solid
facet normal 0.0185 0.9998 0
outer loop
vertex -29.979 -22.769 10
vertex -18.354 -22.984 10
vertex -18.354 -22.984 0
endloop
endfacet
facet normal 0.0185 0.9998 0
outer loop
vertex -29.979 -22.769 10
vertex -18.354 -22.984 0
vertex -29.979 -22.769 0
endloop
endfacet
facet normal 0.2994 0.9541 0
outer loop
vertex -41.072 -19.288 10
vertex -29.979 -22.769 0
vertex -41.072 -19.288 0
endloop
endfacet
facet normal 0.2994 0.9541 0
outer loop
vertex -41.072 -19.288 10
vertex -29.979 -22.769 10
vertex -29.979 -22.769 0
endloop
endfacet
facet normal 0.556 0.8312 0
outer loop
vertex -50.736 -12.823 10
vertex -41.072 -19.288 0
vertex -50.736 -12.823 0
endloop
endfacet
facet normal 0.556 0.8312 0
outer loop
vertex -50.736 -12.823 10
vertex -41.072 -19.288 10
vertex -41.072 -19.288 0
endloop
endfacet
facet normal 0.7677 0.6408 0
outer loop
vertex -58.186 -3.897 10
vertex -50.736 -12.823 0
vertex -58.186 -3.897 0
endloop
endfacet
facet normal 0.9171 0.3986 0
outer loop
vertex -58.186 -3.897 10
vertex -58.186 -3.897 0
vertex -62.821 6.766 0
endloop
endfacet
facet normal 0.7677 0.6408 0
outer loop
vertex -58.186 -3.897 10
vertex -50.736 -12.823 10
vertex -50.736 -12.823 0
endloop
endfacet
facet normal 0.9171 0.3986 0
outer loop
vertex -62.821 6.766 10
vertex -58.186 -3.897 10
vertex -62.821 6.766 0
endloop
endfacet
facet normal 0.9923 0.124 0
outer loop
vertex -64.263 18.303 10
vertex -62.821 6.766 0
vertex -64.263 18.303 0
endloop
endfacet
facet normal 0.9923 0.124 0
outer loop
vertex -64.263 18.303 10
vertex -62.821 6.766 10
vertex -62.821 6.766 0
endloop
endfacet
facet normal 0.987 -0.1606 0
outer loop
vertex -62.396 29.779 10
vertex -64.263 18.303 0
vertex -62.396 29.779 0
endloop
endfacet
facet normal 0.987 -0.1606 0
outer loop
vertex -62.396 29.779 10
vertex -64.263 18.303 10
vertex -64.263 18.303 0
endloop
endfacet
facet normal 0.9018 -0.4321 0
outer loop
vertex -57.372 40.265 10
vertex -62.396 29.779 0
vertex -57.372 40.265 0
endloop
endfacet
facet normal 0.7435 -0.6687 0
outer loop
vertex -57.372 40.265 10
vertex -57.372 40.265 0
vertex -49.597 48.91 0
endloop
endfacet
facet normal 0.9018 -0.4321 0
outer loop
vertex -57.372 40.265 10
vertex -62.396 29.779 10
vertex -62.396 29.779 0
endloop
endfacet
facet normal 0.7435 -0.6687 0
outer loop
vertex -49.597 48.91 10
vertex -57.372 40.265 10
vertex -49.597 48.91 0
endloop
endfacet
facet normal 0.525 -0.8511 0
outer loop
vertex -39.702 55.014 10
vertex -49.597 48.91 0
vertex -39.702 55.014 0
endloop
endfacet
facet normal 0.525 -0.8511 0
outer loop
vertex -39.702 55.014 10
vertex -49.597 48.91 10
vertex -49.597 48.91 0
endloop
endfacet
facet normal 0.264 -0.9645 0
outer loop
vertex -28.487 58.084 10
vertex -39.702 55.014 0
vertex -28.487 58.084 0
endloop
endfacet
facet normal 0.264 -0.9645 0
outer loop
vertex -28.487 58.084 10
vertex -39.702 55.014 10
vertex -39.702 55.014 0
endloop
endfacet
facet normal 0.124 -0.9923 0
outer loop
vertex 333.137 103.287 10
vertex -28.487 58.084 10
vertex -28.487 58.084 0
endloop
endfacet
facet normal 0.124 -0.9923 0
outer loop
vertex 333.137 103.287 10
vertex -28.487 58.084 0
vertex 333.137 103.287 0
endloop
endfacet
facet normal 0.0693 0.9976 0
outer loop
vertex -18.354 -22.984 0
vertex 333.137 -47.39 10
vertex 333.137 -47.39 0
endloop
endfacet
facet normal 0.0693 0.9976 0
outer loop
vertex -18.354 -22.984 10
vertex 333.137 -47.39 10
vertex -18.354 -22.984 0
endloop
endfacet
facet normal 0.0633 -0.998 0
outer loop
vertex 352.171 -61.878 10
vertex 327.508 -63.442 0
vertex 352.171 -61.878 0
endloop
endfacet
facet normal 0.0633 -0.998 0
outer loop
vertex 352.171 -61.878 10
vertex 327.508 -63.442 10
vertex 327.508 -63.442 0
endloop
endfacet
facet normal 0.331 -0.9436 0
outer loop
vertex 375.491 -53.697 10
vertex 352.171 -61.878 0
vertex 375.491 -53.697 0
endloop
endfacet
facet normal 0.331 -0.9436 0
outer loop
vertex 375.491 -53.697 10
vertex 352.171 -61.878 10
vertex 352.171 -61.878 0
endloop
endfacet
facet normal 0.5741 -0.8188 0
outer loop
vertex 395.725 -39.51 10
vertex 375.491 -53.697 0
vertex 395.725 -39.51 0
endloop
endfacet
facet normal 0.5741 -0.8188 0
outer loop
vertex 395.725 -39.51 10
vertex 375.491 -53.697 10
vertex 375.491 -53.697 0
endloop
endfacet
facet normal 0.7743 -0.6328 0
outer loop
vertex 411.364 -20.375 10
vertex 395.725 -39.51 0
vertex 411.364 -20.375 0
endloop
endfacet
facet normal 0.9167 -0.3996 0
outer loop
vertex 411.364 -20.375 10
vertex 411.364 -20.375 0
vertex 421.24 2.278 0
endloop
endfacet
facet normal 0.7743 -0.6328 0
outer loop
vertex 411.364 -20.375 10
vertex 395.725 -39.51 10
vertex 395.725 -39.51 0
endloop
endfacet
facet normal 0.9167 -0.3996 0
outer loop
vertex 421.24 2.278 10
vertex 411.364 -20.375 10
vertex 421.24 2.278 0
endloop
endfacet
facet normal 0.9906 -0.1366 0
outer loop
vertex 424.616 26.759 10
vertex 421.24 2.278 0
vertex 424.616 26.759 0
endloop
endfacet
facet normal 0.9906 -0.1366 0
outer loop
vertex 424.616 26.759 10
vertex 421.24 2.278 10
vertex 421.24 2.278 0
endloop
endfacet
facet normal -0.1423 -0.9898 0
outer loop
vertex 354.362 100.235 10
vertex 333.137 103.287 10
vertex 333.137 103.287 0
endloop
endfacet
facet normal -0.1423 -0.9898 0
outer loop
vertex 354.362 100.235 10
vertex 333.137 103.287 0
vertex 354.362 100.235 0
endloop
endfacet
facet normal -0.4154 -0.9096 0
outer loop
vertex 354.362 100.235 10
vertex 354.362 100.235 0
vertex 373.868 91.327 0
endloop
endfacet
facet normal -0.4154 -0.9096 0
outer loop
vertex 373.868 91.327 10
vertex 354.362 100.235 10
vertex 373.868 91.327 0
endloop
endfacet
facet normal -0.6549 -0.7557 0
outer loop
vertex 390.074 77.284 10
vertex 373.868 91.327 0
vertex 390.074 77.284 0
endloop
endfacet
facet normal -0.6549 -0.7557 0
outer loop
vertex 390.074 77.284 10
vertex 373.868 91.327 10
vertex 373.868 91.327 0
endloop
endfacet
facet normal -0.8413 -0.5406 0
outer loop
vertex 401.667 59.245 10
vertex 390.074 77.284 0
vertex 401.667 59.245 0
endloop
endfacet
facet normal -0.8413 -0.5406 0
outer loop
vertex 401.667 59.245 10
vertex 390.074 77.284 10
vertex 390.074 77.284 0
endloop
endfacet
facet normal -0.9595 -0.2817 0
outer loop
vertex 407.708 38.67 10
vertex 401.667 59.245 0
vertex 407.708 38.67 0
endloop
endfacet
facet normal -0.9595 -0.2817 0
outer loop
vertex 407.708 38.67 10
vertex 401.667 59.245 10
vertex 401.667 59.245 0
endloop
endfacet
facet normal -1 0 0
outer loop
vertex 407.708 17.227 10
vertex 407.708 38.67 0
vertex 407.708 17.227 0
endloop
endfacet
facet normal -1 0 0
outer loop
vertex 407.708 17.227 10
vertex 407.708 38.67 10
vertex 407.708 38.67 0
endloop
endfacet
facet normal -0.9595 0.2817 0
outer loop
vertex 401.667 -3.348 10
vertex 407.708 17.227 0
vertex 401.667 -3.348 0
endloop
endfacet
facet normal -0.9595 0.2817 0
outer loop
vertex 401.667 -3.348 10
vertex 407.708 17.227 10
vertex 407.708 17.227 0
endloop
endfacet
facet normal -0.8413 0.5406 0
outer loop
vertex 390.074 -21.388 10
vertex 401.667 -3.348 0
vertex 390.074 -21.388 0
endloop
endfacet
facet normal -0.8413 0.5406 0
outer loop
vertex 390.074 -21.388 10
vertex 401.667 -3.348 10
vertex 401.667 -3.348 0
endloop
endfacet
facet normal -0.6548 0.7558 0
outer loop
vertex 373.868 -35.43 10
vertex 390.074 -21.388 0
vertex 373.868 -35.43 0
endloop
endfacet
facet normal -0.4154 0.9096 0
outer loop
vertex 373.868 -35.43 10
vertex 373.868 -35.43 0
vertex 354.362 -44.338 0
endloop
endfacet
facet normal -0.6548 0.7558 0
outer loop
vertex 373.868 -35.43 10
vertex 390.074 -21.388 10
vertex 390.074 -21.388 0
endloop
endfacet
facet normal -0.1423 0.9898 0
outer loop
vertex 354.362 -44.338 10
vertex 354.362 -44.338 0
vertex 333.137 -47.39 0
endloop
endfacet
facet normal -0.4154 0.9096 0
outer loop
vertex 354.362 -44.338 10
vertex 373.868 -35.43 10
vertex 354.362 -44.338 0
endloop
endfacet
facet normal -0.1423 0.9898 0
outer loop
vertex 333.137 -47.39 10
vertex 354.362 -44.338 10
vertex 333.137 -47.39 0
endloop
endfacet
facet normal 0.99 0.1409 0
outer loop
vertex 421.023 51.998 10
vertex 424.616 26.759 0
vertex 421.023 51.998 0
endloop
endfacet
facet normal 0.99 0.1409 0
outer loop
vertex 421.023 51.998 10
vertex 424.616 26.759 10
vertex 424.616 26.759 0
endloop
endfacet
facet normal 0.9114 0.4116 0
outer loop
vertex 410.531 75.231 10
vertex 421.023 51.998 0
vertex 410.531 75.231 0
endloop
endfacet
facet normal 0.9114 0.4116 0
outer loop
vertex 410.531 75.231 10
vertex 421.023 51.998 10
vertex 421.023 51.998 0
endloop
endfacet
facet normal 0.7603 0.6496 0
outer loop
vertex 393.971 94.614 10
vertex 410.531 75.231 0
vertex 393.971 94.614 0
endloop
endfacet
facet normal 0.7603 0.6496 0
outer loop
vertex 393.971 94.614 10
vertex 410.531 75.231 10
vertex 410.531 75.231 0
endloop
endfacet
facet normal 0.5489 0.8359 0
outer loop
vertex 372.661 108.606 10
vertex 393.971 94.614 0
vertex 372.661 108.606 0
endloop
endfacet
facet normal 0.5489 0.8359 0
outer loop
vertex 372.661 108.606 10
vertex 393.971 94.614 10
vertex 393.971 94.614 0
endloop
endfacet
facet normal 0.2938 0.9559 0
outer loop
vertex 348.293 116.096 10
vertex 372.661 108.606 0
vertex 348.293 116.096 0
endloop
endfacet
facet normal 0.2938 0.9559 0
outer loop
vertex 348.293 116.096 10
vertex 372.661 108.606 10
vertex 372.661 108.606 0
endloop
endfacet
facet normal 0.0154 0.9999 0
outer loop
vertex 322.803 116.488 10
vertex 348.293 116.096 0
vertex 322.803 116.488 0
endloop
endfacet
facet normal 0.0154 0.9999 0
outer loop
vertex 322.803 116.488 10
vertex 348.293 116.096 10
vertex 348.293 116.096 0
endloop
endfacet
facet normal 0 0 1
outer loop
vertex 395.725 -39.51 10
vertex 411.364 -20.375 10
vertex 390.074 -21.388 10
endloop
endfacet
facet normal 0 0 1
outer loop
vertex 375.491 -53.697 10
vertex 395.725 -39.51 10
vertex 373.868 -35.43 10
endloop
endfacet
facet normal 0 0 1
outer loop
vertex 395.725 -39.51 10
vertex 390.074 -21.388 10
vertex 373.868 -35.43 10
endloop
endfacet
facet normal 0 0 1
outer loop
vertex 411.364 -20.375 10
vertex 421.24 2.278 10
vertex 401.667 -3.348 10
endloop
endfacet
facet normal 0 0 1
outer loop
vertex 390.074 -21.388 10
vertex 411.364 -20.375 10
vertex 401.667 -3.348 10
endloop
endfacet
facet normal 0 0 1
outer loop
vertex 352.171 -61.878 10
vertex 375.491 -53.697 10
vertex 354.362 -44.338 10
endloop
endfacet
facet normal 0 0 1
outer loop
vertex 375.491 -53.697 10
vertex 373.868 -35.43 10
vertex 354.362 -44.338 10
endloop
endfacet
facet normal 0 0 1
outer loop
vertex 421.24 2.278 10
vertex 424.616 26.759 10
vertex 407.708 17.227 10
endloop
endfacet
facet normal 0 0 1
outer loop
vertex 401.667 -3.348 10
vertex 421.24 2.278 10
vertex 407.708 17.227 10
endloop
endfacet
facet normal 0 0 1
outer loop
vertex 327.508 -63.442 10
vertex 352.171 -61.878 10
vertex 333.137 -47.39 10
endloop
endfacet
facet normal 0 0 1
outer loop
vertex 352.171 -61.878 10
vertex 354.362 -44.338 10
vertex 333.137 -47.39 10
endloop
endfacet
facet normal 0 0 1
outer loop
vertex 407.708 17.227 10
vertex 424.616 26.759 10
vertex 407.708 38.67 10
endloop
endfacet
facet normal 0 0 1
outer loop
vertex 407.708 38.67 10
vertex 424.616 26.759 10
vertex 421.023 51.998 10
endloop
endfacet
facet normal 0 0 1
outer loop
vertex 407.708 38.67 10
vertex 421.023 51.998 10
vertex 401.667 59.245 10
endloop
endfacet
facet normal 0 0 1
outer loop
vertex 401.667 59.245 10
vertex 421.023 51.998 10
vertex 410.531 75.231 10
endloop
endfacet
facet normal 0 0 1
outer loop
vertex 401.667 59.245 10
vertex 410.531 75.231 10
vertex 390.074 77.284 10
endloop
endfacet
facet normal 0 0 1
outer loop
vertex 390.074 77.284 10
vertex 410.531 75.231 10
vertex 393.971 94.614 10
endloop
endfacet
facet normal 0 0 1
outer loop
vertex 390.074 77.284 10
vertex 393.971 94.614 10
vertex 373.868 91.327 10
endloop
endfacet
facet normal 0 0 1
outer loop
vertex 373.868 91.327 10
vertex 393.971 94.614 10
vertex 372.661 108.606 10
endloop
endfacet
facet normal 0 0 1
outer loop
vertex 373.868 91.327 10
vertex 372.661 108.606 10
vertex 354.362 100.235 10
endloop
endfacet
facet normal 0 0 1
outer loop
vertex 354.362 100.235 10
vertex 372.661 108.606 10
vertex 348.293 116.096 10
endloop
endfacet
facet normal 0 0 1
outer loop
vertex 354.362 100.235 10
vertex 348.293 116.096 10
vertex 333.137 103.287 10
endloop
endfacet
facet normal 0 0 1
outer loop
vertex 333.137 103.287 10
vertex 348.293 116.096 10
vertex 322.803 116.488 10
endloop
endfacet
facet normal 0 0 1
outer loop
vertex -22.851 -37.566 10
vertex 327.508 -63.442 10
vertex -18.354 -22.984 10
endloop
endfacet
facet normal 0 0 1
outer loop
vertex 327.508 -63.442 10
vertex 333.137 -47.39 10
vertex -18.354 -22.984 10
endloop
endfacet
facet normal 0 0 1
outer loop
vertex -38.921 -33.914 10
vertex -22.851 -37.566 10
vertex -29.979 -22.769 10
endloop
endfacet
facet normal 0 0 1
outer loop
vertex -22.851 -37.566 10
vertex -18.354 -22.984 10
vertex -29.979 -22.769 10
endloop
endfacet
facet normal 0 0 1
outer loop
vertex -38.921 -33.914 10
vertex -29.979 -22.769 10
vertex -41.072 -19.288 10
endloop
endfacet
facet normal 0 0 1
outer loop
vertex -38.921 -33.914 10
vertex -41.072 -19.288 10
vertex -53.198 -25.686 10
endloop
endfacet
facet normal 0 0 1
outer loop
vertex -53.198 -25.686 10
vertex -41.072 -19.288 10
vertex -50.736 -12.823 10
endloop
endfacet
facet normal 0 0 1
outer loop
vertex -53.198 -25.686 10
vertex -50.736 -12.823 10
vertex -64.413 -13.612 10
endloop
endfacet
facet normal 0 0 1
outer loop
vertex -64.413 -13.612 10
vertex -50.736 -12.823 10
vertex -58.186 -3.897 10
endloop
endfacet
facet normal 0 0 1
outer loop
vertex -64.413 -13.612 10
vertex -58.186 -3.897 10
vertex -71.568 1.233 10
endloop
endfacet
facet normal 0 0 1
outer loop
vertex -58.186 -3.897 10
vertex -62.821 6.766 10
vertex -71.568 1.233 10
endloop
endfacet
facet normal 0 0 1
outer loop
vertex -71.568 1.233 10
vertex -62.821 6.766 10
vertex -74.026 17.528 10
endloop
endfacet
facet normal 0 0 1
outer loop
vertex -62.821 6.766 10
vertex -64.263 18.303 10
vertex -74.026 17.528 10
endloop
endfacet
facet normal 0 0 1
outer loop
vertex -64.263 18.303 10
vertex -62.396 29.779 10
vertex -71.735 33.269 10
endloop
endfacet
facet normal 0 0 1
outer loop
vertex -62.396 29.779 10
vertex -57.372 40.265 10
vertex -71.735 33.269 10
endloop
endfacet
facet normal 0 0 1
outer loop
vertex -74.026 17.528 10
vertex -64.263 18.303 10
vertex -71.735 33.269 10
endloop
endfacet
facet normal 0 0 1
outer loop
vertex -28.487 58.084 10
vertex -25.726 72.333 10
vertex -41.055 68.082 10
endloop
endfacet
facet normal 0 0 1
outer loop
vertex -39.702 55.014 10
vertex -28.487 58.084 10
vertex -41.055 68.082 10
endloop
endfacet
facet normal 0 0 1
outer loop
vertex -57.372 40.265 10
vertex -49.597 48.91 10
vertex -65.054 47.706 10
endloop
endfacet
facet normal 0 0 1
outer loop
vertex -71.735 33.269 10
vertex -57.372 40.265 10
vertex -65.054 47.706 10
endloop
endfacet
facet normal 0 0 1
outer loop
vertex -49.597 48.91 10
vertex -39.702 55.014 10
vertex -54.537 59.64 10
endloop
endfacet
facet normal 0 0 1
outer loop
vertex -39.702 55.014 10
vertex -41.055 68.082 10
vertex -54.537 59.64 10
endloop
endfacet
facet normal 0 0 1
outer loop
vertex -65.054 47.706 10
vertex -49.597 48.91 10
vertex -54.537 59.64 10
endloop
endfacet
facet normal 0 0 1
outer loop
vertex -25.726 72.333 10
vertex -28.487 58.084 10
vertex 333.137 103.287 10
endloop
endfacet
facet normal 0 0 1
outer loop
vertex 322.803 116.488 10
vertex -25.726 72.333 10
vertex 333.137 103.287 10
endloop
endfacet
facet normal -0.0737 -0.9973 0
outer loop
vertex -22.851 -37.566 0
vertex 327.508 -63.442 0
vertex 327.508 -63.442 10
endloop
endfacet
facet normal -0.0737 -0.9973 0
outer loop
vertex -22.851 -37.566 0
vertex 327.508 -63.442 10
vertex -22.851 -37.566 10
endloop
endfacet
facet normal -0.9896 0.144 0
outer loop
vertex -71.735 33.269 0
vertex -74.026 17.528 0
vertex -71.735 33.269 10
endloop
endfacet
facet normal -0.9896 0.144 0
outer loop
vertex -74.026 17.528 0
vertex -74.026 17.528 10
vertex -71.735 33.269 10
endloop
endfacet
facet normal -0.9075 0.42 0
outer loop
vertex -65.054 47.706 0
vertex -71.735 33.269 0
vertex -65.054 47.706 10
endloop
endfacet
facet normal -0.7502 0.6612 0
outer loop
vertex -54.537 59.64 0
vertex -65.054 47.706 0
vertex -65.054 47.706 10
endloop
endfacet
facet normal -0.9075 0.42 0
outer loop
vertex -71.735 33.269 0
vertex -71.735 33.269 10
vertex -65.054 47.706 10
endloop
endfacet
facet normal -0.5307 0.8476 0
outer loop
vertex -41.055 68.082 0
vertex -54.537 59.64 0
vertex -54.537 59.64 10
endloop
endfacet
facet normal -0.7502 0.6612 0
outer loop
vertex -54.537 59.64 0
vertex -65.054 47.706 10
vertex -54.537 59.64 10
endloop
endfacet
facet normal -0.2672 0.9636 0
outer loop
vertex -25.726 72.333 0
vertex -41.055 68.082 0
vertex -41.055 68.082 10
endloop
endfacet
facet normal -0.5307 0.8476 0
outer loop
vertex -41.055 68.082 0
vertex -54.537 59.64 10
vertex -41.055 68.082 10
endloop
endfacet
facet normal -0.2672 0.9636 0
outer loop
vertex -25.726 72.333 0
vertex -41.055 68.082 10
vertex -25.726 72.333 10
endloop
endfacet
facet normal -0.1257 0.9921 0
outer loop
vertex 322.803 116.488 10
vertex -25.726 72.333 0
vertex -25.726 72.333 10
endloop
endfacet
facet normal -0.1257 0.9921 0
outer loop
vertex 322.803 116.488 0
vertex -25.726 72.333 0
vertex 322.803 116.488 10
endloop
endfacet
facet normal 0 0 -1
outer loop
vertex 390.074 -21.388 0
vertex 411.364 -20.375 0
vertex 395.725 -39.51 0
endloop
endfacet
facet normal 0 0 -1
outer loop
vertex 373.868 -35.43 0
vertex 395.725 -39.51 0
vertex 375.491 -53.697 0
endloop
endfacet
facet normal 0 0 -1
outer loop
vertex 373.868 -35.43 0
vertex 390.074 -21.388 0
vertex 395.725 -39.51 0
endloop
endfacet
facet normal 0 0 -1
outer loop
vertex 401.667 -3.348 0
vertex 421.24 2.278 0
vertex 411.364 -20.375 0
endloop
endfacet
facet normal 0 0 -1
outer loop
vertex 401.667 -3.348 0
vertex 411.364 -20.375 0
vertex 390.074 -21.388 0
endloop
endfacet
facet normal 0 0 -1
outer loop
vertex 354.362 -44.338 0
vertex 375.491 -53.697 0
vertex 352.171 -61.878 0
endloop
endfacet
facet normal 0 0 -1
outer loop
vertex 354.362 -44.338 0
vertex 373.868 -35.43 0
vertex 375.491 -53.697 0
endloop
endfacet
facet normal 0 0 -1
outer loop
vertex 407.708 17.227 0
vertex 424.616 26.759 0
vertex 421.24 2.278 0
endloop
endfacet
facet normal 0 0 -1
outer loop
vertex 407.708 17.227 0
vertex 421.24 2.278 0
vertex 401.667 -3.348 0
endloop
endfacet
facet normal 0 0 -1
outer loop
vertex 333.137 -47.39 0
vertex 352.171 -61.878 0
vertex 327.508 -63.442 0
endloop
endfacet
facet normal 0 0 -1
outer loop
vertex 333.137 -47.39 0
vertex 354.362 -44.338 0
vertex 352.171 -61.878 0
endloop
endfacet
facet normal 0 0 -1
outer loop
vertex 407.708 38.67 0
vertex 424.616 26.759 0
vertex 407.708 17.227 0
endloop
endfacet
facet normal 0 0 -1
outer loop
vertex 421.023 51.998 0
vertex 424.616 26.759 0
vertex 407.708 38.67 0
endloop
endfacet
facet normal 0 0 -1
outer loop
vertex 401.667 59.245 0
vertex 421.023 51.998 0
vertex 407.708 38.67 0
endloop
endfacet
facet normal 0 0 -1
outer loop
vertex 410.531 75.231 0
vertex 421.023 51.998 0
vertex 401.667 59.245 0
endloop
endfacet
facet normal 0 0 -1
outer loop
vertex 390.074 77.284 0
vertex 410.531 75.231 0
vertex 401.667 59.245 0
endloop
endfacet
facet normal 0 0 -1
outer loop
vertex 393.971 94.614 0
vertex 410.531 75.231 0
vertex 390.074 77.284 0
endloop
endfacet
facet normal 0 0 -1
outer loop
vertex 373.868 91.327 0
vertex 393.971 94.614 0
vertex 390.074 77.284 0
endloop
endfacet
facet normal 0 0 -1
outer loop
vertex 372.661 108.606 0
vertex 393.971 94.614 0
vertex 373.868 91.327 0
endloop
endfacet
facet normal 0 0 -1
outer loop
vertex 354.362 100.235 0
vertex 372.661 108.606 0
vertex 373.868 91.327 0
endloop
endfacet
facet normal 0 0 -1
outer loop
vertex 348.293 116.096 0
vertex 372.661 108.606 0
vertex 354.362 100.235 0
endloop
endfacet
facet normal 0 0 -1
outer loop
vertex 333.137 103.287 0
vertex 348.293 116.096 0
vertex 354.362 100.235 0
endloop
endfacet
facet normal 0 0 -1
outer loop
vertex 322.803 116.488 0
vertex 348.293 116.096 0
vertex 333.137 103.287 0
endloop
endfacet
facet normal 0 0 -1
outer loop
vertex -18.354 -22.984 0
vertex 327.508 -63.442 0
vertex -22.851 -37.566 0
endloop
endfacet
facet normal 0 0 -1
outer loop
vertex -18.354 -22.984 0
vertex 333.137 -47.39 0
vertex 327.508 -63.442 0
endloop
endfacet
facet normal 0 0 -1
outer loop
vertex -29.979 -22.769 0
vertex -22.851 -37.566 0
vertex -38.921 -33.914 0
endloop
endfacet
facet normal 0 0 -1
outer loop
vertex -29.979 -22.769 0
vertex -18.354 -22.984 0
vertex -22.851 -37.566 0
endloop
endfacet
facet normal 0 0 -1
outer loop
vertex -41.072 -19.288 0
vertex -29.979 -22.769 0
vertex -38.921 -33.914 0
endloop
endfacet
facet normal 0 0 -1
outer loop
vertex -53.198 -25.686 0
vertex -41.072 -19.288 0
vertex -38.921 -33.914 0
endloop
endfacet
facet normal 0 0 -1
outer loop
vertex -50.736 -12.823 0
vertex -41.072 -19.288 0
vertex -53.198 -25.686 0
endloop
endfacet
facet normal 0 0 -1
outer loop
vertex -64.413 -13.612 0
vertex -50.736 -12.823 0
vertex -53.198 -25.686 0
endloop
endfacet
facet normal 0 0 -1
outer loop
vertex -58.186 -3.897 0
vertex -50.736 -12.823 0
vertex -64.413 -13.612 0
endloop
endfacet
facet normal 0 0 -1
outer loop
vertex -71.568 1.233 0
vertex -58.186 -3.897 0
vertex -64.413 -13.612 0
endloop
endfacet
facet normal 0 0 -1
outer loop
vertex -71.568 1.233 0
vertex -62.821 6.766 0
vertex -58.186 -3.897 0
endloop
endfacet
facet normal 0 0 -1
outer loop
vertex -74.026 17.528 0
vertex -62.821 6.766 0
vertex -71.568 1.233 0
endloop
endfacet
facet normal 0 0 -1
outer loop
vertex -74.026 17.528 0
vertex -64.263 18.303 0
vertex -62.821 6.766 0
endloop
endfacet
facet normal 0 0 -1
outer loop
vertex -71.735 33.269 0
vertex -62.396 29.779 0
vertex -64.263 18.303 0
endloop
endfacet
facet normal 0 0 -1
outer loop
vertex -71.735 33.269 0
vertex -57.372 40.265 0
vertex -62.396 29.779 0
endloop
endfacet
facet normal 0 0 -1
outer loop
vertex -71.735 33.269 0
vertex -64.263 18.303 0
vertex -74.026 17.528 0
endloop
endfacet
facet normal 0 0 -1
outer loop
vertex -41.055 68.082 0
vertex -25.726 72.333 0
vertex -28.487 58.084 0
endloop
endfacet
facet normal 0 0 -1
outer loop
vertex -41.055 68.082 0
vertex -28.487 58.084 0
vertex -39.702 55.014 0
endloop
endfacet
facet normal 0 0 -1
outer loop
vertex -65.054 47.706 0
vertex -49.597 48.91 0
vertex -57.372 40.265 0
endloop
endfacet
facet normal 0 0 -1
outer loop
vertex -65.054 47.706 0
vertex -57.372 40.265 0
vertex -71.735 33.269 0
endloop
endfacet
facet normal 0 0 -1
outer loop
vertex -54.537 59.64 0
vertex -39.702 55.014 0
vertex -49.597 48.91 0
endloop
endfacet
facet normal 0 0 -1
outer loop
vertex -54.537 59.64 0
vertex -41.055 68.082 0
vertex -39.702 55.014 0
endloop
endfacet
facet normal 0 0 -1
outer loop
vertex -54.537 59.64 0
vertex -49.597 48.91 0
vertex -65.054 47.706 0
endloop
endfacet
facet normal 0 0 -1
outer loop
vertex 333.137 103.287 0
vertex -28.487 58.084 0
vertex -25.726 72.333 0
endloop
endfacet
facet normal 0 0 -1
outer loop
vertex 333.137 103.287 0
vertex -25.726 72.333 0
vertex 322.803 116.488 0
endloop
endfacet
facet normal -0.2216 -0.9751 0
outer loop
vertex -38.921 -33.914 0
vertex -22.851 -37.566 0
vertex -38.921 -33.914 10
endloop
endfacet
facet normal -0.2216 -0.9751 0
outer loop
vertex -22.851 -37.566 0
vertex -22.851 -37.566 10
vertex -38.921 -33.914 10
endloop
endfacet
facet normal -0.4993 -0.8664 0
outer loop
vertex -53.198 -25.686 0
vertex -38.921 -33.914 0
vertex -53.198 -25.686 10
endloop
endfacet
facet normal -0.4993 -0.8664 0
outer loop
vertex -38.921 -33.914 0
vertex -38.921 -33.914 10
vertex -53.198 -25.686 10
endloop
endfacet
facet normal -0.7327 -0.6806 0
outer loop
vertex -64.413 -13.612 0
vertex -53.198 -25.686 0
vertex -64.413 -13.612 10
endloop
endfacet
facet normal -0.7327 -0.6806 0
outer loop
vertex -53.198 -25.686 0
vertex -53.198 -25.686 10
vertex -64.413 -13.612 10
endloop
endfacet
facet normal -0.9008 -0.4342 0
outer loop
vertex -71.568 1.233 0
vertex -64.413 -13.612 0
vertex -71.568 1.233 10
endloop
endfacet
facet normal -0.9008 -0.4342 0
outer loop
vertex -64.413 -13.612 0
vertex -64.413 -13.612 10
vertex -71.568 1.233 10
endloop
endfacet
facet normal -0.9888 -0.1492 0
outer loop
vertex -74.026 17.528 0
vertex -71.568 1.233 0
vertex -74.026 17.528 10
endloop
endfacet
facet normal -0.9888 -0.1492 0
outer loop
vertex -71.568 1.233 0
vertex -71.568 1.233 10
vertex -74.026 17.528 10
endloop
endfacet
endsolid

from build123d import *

# Parameters (mm, degrees)
EXTRUDE_1_DEPTH     = 10
FILLET_1_R          = 55.243368
FILLET_2_R          = 90.446111
CUT_EXTRUDE_1_DEPTH = 10


with BuildPart() as part:
    # 草图1 → 凸台-拉伸1 (new body)
    with BuildSketch(Plane.XY):
        Polygon((424.616260913, 129.386586507), (424.616260913, -70.613413493), (-74.025647104, -33.786146841), (-74.025647104, 66.213853159), align=None)
    extrude(amount=EXTRUDE_1_DEPTH)

    # 圆角1
    fillet_1_edges = [part.edges().sort_by_distance(p)[0] for p in [
        (-74.025647104, -33.786146841, 5),
        (-74.025647104, 66.213853159, 5),
    ]]
    fillet(fillet_1_edges, radius=FILLET_1_R - 0.0001)  # a hair under: the kernel refuses the full size

    # 圆角2
    fillet_2_edges = [part.edges().sort_by_distance(p)[0] for p in [
        (424.616260913, 129.386586507, 5),
        (424.616260913, -70.613413493, 5),
    ]]
    fillet(fillet_2_edges, radius=FILLET_2_R - 0.0001)  # a hair under: the kernel refuses the full size

    # 草图2 → 切除-拉伸1 (cut)
    with BuildSketch(Plane.XY.offset(10)):
        with BuildLine():
            Line((-28.487167505, 58.083637567), (333.136967432, 103.286654435))
            ThreePointArc((333.136967432, 103.286654435), (408.475328877, 27.948292989), (333.136967432, -47.390068456))
            Line((333.136967432, -47.390068456), (-18.353743943, -22.983750924))
            ThreePointArc((-18.353743943, -22.983750924), (-63.95414997, 12.483231541), (-28.487167505, 58.083637567))
        make_face()
    extrude(amount=-CUT_EXTRUDE_1_DEPTH, mode=Mode.SUBTRACT)


solid = part.part
